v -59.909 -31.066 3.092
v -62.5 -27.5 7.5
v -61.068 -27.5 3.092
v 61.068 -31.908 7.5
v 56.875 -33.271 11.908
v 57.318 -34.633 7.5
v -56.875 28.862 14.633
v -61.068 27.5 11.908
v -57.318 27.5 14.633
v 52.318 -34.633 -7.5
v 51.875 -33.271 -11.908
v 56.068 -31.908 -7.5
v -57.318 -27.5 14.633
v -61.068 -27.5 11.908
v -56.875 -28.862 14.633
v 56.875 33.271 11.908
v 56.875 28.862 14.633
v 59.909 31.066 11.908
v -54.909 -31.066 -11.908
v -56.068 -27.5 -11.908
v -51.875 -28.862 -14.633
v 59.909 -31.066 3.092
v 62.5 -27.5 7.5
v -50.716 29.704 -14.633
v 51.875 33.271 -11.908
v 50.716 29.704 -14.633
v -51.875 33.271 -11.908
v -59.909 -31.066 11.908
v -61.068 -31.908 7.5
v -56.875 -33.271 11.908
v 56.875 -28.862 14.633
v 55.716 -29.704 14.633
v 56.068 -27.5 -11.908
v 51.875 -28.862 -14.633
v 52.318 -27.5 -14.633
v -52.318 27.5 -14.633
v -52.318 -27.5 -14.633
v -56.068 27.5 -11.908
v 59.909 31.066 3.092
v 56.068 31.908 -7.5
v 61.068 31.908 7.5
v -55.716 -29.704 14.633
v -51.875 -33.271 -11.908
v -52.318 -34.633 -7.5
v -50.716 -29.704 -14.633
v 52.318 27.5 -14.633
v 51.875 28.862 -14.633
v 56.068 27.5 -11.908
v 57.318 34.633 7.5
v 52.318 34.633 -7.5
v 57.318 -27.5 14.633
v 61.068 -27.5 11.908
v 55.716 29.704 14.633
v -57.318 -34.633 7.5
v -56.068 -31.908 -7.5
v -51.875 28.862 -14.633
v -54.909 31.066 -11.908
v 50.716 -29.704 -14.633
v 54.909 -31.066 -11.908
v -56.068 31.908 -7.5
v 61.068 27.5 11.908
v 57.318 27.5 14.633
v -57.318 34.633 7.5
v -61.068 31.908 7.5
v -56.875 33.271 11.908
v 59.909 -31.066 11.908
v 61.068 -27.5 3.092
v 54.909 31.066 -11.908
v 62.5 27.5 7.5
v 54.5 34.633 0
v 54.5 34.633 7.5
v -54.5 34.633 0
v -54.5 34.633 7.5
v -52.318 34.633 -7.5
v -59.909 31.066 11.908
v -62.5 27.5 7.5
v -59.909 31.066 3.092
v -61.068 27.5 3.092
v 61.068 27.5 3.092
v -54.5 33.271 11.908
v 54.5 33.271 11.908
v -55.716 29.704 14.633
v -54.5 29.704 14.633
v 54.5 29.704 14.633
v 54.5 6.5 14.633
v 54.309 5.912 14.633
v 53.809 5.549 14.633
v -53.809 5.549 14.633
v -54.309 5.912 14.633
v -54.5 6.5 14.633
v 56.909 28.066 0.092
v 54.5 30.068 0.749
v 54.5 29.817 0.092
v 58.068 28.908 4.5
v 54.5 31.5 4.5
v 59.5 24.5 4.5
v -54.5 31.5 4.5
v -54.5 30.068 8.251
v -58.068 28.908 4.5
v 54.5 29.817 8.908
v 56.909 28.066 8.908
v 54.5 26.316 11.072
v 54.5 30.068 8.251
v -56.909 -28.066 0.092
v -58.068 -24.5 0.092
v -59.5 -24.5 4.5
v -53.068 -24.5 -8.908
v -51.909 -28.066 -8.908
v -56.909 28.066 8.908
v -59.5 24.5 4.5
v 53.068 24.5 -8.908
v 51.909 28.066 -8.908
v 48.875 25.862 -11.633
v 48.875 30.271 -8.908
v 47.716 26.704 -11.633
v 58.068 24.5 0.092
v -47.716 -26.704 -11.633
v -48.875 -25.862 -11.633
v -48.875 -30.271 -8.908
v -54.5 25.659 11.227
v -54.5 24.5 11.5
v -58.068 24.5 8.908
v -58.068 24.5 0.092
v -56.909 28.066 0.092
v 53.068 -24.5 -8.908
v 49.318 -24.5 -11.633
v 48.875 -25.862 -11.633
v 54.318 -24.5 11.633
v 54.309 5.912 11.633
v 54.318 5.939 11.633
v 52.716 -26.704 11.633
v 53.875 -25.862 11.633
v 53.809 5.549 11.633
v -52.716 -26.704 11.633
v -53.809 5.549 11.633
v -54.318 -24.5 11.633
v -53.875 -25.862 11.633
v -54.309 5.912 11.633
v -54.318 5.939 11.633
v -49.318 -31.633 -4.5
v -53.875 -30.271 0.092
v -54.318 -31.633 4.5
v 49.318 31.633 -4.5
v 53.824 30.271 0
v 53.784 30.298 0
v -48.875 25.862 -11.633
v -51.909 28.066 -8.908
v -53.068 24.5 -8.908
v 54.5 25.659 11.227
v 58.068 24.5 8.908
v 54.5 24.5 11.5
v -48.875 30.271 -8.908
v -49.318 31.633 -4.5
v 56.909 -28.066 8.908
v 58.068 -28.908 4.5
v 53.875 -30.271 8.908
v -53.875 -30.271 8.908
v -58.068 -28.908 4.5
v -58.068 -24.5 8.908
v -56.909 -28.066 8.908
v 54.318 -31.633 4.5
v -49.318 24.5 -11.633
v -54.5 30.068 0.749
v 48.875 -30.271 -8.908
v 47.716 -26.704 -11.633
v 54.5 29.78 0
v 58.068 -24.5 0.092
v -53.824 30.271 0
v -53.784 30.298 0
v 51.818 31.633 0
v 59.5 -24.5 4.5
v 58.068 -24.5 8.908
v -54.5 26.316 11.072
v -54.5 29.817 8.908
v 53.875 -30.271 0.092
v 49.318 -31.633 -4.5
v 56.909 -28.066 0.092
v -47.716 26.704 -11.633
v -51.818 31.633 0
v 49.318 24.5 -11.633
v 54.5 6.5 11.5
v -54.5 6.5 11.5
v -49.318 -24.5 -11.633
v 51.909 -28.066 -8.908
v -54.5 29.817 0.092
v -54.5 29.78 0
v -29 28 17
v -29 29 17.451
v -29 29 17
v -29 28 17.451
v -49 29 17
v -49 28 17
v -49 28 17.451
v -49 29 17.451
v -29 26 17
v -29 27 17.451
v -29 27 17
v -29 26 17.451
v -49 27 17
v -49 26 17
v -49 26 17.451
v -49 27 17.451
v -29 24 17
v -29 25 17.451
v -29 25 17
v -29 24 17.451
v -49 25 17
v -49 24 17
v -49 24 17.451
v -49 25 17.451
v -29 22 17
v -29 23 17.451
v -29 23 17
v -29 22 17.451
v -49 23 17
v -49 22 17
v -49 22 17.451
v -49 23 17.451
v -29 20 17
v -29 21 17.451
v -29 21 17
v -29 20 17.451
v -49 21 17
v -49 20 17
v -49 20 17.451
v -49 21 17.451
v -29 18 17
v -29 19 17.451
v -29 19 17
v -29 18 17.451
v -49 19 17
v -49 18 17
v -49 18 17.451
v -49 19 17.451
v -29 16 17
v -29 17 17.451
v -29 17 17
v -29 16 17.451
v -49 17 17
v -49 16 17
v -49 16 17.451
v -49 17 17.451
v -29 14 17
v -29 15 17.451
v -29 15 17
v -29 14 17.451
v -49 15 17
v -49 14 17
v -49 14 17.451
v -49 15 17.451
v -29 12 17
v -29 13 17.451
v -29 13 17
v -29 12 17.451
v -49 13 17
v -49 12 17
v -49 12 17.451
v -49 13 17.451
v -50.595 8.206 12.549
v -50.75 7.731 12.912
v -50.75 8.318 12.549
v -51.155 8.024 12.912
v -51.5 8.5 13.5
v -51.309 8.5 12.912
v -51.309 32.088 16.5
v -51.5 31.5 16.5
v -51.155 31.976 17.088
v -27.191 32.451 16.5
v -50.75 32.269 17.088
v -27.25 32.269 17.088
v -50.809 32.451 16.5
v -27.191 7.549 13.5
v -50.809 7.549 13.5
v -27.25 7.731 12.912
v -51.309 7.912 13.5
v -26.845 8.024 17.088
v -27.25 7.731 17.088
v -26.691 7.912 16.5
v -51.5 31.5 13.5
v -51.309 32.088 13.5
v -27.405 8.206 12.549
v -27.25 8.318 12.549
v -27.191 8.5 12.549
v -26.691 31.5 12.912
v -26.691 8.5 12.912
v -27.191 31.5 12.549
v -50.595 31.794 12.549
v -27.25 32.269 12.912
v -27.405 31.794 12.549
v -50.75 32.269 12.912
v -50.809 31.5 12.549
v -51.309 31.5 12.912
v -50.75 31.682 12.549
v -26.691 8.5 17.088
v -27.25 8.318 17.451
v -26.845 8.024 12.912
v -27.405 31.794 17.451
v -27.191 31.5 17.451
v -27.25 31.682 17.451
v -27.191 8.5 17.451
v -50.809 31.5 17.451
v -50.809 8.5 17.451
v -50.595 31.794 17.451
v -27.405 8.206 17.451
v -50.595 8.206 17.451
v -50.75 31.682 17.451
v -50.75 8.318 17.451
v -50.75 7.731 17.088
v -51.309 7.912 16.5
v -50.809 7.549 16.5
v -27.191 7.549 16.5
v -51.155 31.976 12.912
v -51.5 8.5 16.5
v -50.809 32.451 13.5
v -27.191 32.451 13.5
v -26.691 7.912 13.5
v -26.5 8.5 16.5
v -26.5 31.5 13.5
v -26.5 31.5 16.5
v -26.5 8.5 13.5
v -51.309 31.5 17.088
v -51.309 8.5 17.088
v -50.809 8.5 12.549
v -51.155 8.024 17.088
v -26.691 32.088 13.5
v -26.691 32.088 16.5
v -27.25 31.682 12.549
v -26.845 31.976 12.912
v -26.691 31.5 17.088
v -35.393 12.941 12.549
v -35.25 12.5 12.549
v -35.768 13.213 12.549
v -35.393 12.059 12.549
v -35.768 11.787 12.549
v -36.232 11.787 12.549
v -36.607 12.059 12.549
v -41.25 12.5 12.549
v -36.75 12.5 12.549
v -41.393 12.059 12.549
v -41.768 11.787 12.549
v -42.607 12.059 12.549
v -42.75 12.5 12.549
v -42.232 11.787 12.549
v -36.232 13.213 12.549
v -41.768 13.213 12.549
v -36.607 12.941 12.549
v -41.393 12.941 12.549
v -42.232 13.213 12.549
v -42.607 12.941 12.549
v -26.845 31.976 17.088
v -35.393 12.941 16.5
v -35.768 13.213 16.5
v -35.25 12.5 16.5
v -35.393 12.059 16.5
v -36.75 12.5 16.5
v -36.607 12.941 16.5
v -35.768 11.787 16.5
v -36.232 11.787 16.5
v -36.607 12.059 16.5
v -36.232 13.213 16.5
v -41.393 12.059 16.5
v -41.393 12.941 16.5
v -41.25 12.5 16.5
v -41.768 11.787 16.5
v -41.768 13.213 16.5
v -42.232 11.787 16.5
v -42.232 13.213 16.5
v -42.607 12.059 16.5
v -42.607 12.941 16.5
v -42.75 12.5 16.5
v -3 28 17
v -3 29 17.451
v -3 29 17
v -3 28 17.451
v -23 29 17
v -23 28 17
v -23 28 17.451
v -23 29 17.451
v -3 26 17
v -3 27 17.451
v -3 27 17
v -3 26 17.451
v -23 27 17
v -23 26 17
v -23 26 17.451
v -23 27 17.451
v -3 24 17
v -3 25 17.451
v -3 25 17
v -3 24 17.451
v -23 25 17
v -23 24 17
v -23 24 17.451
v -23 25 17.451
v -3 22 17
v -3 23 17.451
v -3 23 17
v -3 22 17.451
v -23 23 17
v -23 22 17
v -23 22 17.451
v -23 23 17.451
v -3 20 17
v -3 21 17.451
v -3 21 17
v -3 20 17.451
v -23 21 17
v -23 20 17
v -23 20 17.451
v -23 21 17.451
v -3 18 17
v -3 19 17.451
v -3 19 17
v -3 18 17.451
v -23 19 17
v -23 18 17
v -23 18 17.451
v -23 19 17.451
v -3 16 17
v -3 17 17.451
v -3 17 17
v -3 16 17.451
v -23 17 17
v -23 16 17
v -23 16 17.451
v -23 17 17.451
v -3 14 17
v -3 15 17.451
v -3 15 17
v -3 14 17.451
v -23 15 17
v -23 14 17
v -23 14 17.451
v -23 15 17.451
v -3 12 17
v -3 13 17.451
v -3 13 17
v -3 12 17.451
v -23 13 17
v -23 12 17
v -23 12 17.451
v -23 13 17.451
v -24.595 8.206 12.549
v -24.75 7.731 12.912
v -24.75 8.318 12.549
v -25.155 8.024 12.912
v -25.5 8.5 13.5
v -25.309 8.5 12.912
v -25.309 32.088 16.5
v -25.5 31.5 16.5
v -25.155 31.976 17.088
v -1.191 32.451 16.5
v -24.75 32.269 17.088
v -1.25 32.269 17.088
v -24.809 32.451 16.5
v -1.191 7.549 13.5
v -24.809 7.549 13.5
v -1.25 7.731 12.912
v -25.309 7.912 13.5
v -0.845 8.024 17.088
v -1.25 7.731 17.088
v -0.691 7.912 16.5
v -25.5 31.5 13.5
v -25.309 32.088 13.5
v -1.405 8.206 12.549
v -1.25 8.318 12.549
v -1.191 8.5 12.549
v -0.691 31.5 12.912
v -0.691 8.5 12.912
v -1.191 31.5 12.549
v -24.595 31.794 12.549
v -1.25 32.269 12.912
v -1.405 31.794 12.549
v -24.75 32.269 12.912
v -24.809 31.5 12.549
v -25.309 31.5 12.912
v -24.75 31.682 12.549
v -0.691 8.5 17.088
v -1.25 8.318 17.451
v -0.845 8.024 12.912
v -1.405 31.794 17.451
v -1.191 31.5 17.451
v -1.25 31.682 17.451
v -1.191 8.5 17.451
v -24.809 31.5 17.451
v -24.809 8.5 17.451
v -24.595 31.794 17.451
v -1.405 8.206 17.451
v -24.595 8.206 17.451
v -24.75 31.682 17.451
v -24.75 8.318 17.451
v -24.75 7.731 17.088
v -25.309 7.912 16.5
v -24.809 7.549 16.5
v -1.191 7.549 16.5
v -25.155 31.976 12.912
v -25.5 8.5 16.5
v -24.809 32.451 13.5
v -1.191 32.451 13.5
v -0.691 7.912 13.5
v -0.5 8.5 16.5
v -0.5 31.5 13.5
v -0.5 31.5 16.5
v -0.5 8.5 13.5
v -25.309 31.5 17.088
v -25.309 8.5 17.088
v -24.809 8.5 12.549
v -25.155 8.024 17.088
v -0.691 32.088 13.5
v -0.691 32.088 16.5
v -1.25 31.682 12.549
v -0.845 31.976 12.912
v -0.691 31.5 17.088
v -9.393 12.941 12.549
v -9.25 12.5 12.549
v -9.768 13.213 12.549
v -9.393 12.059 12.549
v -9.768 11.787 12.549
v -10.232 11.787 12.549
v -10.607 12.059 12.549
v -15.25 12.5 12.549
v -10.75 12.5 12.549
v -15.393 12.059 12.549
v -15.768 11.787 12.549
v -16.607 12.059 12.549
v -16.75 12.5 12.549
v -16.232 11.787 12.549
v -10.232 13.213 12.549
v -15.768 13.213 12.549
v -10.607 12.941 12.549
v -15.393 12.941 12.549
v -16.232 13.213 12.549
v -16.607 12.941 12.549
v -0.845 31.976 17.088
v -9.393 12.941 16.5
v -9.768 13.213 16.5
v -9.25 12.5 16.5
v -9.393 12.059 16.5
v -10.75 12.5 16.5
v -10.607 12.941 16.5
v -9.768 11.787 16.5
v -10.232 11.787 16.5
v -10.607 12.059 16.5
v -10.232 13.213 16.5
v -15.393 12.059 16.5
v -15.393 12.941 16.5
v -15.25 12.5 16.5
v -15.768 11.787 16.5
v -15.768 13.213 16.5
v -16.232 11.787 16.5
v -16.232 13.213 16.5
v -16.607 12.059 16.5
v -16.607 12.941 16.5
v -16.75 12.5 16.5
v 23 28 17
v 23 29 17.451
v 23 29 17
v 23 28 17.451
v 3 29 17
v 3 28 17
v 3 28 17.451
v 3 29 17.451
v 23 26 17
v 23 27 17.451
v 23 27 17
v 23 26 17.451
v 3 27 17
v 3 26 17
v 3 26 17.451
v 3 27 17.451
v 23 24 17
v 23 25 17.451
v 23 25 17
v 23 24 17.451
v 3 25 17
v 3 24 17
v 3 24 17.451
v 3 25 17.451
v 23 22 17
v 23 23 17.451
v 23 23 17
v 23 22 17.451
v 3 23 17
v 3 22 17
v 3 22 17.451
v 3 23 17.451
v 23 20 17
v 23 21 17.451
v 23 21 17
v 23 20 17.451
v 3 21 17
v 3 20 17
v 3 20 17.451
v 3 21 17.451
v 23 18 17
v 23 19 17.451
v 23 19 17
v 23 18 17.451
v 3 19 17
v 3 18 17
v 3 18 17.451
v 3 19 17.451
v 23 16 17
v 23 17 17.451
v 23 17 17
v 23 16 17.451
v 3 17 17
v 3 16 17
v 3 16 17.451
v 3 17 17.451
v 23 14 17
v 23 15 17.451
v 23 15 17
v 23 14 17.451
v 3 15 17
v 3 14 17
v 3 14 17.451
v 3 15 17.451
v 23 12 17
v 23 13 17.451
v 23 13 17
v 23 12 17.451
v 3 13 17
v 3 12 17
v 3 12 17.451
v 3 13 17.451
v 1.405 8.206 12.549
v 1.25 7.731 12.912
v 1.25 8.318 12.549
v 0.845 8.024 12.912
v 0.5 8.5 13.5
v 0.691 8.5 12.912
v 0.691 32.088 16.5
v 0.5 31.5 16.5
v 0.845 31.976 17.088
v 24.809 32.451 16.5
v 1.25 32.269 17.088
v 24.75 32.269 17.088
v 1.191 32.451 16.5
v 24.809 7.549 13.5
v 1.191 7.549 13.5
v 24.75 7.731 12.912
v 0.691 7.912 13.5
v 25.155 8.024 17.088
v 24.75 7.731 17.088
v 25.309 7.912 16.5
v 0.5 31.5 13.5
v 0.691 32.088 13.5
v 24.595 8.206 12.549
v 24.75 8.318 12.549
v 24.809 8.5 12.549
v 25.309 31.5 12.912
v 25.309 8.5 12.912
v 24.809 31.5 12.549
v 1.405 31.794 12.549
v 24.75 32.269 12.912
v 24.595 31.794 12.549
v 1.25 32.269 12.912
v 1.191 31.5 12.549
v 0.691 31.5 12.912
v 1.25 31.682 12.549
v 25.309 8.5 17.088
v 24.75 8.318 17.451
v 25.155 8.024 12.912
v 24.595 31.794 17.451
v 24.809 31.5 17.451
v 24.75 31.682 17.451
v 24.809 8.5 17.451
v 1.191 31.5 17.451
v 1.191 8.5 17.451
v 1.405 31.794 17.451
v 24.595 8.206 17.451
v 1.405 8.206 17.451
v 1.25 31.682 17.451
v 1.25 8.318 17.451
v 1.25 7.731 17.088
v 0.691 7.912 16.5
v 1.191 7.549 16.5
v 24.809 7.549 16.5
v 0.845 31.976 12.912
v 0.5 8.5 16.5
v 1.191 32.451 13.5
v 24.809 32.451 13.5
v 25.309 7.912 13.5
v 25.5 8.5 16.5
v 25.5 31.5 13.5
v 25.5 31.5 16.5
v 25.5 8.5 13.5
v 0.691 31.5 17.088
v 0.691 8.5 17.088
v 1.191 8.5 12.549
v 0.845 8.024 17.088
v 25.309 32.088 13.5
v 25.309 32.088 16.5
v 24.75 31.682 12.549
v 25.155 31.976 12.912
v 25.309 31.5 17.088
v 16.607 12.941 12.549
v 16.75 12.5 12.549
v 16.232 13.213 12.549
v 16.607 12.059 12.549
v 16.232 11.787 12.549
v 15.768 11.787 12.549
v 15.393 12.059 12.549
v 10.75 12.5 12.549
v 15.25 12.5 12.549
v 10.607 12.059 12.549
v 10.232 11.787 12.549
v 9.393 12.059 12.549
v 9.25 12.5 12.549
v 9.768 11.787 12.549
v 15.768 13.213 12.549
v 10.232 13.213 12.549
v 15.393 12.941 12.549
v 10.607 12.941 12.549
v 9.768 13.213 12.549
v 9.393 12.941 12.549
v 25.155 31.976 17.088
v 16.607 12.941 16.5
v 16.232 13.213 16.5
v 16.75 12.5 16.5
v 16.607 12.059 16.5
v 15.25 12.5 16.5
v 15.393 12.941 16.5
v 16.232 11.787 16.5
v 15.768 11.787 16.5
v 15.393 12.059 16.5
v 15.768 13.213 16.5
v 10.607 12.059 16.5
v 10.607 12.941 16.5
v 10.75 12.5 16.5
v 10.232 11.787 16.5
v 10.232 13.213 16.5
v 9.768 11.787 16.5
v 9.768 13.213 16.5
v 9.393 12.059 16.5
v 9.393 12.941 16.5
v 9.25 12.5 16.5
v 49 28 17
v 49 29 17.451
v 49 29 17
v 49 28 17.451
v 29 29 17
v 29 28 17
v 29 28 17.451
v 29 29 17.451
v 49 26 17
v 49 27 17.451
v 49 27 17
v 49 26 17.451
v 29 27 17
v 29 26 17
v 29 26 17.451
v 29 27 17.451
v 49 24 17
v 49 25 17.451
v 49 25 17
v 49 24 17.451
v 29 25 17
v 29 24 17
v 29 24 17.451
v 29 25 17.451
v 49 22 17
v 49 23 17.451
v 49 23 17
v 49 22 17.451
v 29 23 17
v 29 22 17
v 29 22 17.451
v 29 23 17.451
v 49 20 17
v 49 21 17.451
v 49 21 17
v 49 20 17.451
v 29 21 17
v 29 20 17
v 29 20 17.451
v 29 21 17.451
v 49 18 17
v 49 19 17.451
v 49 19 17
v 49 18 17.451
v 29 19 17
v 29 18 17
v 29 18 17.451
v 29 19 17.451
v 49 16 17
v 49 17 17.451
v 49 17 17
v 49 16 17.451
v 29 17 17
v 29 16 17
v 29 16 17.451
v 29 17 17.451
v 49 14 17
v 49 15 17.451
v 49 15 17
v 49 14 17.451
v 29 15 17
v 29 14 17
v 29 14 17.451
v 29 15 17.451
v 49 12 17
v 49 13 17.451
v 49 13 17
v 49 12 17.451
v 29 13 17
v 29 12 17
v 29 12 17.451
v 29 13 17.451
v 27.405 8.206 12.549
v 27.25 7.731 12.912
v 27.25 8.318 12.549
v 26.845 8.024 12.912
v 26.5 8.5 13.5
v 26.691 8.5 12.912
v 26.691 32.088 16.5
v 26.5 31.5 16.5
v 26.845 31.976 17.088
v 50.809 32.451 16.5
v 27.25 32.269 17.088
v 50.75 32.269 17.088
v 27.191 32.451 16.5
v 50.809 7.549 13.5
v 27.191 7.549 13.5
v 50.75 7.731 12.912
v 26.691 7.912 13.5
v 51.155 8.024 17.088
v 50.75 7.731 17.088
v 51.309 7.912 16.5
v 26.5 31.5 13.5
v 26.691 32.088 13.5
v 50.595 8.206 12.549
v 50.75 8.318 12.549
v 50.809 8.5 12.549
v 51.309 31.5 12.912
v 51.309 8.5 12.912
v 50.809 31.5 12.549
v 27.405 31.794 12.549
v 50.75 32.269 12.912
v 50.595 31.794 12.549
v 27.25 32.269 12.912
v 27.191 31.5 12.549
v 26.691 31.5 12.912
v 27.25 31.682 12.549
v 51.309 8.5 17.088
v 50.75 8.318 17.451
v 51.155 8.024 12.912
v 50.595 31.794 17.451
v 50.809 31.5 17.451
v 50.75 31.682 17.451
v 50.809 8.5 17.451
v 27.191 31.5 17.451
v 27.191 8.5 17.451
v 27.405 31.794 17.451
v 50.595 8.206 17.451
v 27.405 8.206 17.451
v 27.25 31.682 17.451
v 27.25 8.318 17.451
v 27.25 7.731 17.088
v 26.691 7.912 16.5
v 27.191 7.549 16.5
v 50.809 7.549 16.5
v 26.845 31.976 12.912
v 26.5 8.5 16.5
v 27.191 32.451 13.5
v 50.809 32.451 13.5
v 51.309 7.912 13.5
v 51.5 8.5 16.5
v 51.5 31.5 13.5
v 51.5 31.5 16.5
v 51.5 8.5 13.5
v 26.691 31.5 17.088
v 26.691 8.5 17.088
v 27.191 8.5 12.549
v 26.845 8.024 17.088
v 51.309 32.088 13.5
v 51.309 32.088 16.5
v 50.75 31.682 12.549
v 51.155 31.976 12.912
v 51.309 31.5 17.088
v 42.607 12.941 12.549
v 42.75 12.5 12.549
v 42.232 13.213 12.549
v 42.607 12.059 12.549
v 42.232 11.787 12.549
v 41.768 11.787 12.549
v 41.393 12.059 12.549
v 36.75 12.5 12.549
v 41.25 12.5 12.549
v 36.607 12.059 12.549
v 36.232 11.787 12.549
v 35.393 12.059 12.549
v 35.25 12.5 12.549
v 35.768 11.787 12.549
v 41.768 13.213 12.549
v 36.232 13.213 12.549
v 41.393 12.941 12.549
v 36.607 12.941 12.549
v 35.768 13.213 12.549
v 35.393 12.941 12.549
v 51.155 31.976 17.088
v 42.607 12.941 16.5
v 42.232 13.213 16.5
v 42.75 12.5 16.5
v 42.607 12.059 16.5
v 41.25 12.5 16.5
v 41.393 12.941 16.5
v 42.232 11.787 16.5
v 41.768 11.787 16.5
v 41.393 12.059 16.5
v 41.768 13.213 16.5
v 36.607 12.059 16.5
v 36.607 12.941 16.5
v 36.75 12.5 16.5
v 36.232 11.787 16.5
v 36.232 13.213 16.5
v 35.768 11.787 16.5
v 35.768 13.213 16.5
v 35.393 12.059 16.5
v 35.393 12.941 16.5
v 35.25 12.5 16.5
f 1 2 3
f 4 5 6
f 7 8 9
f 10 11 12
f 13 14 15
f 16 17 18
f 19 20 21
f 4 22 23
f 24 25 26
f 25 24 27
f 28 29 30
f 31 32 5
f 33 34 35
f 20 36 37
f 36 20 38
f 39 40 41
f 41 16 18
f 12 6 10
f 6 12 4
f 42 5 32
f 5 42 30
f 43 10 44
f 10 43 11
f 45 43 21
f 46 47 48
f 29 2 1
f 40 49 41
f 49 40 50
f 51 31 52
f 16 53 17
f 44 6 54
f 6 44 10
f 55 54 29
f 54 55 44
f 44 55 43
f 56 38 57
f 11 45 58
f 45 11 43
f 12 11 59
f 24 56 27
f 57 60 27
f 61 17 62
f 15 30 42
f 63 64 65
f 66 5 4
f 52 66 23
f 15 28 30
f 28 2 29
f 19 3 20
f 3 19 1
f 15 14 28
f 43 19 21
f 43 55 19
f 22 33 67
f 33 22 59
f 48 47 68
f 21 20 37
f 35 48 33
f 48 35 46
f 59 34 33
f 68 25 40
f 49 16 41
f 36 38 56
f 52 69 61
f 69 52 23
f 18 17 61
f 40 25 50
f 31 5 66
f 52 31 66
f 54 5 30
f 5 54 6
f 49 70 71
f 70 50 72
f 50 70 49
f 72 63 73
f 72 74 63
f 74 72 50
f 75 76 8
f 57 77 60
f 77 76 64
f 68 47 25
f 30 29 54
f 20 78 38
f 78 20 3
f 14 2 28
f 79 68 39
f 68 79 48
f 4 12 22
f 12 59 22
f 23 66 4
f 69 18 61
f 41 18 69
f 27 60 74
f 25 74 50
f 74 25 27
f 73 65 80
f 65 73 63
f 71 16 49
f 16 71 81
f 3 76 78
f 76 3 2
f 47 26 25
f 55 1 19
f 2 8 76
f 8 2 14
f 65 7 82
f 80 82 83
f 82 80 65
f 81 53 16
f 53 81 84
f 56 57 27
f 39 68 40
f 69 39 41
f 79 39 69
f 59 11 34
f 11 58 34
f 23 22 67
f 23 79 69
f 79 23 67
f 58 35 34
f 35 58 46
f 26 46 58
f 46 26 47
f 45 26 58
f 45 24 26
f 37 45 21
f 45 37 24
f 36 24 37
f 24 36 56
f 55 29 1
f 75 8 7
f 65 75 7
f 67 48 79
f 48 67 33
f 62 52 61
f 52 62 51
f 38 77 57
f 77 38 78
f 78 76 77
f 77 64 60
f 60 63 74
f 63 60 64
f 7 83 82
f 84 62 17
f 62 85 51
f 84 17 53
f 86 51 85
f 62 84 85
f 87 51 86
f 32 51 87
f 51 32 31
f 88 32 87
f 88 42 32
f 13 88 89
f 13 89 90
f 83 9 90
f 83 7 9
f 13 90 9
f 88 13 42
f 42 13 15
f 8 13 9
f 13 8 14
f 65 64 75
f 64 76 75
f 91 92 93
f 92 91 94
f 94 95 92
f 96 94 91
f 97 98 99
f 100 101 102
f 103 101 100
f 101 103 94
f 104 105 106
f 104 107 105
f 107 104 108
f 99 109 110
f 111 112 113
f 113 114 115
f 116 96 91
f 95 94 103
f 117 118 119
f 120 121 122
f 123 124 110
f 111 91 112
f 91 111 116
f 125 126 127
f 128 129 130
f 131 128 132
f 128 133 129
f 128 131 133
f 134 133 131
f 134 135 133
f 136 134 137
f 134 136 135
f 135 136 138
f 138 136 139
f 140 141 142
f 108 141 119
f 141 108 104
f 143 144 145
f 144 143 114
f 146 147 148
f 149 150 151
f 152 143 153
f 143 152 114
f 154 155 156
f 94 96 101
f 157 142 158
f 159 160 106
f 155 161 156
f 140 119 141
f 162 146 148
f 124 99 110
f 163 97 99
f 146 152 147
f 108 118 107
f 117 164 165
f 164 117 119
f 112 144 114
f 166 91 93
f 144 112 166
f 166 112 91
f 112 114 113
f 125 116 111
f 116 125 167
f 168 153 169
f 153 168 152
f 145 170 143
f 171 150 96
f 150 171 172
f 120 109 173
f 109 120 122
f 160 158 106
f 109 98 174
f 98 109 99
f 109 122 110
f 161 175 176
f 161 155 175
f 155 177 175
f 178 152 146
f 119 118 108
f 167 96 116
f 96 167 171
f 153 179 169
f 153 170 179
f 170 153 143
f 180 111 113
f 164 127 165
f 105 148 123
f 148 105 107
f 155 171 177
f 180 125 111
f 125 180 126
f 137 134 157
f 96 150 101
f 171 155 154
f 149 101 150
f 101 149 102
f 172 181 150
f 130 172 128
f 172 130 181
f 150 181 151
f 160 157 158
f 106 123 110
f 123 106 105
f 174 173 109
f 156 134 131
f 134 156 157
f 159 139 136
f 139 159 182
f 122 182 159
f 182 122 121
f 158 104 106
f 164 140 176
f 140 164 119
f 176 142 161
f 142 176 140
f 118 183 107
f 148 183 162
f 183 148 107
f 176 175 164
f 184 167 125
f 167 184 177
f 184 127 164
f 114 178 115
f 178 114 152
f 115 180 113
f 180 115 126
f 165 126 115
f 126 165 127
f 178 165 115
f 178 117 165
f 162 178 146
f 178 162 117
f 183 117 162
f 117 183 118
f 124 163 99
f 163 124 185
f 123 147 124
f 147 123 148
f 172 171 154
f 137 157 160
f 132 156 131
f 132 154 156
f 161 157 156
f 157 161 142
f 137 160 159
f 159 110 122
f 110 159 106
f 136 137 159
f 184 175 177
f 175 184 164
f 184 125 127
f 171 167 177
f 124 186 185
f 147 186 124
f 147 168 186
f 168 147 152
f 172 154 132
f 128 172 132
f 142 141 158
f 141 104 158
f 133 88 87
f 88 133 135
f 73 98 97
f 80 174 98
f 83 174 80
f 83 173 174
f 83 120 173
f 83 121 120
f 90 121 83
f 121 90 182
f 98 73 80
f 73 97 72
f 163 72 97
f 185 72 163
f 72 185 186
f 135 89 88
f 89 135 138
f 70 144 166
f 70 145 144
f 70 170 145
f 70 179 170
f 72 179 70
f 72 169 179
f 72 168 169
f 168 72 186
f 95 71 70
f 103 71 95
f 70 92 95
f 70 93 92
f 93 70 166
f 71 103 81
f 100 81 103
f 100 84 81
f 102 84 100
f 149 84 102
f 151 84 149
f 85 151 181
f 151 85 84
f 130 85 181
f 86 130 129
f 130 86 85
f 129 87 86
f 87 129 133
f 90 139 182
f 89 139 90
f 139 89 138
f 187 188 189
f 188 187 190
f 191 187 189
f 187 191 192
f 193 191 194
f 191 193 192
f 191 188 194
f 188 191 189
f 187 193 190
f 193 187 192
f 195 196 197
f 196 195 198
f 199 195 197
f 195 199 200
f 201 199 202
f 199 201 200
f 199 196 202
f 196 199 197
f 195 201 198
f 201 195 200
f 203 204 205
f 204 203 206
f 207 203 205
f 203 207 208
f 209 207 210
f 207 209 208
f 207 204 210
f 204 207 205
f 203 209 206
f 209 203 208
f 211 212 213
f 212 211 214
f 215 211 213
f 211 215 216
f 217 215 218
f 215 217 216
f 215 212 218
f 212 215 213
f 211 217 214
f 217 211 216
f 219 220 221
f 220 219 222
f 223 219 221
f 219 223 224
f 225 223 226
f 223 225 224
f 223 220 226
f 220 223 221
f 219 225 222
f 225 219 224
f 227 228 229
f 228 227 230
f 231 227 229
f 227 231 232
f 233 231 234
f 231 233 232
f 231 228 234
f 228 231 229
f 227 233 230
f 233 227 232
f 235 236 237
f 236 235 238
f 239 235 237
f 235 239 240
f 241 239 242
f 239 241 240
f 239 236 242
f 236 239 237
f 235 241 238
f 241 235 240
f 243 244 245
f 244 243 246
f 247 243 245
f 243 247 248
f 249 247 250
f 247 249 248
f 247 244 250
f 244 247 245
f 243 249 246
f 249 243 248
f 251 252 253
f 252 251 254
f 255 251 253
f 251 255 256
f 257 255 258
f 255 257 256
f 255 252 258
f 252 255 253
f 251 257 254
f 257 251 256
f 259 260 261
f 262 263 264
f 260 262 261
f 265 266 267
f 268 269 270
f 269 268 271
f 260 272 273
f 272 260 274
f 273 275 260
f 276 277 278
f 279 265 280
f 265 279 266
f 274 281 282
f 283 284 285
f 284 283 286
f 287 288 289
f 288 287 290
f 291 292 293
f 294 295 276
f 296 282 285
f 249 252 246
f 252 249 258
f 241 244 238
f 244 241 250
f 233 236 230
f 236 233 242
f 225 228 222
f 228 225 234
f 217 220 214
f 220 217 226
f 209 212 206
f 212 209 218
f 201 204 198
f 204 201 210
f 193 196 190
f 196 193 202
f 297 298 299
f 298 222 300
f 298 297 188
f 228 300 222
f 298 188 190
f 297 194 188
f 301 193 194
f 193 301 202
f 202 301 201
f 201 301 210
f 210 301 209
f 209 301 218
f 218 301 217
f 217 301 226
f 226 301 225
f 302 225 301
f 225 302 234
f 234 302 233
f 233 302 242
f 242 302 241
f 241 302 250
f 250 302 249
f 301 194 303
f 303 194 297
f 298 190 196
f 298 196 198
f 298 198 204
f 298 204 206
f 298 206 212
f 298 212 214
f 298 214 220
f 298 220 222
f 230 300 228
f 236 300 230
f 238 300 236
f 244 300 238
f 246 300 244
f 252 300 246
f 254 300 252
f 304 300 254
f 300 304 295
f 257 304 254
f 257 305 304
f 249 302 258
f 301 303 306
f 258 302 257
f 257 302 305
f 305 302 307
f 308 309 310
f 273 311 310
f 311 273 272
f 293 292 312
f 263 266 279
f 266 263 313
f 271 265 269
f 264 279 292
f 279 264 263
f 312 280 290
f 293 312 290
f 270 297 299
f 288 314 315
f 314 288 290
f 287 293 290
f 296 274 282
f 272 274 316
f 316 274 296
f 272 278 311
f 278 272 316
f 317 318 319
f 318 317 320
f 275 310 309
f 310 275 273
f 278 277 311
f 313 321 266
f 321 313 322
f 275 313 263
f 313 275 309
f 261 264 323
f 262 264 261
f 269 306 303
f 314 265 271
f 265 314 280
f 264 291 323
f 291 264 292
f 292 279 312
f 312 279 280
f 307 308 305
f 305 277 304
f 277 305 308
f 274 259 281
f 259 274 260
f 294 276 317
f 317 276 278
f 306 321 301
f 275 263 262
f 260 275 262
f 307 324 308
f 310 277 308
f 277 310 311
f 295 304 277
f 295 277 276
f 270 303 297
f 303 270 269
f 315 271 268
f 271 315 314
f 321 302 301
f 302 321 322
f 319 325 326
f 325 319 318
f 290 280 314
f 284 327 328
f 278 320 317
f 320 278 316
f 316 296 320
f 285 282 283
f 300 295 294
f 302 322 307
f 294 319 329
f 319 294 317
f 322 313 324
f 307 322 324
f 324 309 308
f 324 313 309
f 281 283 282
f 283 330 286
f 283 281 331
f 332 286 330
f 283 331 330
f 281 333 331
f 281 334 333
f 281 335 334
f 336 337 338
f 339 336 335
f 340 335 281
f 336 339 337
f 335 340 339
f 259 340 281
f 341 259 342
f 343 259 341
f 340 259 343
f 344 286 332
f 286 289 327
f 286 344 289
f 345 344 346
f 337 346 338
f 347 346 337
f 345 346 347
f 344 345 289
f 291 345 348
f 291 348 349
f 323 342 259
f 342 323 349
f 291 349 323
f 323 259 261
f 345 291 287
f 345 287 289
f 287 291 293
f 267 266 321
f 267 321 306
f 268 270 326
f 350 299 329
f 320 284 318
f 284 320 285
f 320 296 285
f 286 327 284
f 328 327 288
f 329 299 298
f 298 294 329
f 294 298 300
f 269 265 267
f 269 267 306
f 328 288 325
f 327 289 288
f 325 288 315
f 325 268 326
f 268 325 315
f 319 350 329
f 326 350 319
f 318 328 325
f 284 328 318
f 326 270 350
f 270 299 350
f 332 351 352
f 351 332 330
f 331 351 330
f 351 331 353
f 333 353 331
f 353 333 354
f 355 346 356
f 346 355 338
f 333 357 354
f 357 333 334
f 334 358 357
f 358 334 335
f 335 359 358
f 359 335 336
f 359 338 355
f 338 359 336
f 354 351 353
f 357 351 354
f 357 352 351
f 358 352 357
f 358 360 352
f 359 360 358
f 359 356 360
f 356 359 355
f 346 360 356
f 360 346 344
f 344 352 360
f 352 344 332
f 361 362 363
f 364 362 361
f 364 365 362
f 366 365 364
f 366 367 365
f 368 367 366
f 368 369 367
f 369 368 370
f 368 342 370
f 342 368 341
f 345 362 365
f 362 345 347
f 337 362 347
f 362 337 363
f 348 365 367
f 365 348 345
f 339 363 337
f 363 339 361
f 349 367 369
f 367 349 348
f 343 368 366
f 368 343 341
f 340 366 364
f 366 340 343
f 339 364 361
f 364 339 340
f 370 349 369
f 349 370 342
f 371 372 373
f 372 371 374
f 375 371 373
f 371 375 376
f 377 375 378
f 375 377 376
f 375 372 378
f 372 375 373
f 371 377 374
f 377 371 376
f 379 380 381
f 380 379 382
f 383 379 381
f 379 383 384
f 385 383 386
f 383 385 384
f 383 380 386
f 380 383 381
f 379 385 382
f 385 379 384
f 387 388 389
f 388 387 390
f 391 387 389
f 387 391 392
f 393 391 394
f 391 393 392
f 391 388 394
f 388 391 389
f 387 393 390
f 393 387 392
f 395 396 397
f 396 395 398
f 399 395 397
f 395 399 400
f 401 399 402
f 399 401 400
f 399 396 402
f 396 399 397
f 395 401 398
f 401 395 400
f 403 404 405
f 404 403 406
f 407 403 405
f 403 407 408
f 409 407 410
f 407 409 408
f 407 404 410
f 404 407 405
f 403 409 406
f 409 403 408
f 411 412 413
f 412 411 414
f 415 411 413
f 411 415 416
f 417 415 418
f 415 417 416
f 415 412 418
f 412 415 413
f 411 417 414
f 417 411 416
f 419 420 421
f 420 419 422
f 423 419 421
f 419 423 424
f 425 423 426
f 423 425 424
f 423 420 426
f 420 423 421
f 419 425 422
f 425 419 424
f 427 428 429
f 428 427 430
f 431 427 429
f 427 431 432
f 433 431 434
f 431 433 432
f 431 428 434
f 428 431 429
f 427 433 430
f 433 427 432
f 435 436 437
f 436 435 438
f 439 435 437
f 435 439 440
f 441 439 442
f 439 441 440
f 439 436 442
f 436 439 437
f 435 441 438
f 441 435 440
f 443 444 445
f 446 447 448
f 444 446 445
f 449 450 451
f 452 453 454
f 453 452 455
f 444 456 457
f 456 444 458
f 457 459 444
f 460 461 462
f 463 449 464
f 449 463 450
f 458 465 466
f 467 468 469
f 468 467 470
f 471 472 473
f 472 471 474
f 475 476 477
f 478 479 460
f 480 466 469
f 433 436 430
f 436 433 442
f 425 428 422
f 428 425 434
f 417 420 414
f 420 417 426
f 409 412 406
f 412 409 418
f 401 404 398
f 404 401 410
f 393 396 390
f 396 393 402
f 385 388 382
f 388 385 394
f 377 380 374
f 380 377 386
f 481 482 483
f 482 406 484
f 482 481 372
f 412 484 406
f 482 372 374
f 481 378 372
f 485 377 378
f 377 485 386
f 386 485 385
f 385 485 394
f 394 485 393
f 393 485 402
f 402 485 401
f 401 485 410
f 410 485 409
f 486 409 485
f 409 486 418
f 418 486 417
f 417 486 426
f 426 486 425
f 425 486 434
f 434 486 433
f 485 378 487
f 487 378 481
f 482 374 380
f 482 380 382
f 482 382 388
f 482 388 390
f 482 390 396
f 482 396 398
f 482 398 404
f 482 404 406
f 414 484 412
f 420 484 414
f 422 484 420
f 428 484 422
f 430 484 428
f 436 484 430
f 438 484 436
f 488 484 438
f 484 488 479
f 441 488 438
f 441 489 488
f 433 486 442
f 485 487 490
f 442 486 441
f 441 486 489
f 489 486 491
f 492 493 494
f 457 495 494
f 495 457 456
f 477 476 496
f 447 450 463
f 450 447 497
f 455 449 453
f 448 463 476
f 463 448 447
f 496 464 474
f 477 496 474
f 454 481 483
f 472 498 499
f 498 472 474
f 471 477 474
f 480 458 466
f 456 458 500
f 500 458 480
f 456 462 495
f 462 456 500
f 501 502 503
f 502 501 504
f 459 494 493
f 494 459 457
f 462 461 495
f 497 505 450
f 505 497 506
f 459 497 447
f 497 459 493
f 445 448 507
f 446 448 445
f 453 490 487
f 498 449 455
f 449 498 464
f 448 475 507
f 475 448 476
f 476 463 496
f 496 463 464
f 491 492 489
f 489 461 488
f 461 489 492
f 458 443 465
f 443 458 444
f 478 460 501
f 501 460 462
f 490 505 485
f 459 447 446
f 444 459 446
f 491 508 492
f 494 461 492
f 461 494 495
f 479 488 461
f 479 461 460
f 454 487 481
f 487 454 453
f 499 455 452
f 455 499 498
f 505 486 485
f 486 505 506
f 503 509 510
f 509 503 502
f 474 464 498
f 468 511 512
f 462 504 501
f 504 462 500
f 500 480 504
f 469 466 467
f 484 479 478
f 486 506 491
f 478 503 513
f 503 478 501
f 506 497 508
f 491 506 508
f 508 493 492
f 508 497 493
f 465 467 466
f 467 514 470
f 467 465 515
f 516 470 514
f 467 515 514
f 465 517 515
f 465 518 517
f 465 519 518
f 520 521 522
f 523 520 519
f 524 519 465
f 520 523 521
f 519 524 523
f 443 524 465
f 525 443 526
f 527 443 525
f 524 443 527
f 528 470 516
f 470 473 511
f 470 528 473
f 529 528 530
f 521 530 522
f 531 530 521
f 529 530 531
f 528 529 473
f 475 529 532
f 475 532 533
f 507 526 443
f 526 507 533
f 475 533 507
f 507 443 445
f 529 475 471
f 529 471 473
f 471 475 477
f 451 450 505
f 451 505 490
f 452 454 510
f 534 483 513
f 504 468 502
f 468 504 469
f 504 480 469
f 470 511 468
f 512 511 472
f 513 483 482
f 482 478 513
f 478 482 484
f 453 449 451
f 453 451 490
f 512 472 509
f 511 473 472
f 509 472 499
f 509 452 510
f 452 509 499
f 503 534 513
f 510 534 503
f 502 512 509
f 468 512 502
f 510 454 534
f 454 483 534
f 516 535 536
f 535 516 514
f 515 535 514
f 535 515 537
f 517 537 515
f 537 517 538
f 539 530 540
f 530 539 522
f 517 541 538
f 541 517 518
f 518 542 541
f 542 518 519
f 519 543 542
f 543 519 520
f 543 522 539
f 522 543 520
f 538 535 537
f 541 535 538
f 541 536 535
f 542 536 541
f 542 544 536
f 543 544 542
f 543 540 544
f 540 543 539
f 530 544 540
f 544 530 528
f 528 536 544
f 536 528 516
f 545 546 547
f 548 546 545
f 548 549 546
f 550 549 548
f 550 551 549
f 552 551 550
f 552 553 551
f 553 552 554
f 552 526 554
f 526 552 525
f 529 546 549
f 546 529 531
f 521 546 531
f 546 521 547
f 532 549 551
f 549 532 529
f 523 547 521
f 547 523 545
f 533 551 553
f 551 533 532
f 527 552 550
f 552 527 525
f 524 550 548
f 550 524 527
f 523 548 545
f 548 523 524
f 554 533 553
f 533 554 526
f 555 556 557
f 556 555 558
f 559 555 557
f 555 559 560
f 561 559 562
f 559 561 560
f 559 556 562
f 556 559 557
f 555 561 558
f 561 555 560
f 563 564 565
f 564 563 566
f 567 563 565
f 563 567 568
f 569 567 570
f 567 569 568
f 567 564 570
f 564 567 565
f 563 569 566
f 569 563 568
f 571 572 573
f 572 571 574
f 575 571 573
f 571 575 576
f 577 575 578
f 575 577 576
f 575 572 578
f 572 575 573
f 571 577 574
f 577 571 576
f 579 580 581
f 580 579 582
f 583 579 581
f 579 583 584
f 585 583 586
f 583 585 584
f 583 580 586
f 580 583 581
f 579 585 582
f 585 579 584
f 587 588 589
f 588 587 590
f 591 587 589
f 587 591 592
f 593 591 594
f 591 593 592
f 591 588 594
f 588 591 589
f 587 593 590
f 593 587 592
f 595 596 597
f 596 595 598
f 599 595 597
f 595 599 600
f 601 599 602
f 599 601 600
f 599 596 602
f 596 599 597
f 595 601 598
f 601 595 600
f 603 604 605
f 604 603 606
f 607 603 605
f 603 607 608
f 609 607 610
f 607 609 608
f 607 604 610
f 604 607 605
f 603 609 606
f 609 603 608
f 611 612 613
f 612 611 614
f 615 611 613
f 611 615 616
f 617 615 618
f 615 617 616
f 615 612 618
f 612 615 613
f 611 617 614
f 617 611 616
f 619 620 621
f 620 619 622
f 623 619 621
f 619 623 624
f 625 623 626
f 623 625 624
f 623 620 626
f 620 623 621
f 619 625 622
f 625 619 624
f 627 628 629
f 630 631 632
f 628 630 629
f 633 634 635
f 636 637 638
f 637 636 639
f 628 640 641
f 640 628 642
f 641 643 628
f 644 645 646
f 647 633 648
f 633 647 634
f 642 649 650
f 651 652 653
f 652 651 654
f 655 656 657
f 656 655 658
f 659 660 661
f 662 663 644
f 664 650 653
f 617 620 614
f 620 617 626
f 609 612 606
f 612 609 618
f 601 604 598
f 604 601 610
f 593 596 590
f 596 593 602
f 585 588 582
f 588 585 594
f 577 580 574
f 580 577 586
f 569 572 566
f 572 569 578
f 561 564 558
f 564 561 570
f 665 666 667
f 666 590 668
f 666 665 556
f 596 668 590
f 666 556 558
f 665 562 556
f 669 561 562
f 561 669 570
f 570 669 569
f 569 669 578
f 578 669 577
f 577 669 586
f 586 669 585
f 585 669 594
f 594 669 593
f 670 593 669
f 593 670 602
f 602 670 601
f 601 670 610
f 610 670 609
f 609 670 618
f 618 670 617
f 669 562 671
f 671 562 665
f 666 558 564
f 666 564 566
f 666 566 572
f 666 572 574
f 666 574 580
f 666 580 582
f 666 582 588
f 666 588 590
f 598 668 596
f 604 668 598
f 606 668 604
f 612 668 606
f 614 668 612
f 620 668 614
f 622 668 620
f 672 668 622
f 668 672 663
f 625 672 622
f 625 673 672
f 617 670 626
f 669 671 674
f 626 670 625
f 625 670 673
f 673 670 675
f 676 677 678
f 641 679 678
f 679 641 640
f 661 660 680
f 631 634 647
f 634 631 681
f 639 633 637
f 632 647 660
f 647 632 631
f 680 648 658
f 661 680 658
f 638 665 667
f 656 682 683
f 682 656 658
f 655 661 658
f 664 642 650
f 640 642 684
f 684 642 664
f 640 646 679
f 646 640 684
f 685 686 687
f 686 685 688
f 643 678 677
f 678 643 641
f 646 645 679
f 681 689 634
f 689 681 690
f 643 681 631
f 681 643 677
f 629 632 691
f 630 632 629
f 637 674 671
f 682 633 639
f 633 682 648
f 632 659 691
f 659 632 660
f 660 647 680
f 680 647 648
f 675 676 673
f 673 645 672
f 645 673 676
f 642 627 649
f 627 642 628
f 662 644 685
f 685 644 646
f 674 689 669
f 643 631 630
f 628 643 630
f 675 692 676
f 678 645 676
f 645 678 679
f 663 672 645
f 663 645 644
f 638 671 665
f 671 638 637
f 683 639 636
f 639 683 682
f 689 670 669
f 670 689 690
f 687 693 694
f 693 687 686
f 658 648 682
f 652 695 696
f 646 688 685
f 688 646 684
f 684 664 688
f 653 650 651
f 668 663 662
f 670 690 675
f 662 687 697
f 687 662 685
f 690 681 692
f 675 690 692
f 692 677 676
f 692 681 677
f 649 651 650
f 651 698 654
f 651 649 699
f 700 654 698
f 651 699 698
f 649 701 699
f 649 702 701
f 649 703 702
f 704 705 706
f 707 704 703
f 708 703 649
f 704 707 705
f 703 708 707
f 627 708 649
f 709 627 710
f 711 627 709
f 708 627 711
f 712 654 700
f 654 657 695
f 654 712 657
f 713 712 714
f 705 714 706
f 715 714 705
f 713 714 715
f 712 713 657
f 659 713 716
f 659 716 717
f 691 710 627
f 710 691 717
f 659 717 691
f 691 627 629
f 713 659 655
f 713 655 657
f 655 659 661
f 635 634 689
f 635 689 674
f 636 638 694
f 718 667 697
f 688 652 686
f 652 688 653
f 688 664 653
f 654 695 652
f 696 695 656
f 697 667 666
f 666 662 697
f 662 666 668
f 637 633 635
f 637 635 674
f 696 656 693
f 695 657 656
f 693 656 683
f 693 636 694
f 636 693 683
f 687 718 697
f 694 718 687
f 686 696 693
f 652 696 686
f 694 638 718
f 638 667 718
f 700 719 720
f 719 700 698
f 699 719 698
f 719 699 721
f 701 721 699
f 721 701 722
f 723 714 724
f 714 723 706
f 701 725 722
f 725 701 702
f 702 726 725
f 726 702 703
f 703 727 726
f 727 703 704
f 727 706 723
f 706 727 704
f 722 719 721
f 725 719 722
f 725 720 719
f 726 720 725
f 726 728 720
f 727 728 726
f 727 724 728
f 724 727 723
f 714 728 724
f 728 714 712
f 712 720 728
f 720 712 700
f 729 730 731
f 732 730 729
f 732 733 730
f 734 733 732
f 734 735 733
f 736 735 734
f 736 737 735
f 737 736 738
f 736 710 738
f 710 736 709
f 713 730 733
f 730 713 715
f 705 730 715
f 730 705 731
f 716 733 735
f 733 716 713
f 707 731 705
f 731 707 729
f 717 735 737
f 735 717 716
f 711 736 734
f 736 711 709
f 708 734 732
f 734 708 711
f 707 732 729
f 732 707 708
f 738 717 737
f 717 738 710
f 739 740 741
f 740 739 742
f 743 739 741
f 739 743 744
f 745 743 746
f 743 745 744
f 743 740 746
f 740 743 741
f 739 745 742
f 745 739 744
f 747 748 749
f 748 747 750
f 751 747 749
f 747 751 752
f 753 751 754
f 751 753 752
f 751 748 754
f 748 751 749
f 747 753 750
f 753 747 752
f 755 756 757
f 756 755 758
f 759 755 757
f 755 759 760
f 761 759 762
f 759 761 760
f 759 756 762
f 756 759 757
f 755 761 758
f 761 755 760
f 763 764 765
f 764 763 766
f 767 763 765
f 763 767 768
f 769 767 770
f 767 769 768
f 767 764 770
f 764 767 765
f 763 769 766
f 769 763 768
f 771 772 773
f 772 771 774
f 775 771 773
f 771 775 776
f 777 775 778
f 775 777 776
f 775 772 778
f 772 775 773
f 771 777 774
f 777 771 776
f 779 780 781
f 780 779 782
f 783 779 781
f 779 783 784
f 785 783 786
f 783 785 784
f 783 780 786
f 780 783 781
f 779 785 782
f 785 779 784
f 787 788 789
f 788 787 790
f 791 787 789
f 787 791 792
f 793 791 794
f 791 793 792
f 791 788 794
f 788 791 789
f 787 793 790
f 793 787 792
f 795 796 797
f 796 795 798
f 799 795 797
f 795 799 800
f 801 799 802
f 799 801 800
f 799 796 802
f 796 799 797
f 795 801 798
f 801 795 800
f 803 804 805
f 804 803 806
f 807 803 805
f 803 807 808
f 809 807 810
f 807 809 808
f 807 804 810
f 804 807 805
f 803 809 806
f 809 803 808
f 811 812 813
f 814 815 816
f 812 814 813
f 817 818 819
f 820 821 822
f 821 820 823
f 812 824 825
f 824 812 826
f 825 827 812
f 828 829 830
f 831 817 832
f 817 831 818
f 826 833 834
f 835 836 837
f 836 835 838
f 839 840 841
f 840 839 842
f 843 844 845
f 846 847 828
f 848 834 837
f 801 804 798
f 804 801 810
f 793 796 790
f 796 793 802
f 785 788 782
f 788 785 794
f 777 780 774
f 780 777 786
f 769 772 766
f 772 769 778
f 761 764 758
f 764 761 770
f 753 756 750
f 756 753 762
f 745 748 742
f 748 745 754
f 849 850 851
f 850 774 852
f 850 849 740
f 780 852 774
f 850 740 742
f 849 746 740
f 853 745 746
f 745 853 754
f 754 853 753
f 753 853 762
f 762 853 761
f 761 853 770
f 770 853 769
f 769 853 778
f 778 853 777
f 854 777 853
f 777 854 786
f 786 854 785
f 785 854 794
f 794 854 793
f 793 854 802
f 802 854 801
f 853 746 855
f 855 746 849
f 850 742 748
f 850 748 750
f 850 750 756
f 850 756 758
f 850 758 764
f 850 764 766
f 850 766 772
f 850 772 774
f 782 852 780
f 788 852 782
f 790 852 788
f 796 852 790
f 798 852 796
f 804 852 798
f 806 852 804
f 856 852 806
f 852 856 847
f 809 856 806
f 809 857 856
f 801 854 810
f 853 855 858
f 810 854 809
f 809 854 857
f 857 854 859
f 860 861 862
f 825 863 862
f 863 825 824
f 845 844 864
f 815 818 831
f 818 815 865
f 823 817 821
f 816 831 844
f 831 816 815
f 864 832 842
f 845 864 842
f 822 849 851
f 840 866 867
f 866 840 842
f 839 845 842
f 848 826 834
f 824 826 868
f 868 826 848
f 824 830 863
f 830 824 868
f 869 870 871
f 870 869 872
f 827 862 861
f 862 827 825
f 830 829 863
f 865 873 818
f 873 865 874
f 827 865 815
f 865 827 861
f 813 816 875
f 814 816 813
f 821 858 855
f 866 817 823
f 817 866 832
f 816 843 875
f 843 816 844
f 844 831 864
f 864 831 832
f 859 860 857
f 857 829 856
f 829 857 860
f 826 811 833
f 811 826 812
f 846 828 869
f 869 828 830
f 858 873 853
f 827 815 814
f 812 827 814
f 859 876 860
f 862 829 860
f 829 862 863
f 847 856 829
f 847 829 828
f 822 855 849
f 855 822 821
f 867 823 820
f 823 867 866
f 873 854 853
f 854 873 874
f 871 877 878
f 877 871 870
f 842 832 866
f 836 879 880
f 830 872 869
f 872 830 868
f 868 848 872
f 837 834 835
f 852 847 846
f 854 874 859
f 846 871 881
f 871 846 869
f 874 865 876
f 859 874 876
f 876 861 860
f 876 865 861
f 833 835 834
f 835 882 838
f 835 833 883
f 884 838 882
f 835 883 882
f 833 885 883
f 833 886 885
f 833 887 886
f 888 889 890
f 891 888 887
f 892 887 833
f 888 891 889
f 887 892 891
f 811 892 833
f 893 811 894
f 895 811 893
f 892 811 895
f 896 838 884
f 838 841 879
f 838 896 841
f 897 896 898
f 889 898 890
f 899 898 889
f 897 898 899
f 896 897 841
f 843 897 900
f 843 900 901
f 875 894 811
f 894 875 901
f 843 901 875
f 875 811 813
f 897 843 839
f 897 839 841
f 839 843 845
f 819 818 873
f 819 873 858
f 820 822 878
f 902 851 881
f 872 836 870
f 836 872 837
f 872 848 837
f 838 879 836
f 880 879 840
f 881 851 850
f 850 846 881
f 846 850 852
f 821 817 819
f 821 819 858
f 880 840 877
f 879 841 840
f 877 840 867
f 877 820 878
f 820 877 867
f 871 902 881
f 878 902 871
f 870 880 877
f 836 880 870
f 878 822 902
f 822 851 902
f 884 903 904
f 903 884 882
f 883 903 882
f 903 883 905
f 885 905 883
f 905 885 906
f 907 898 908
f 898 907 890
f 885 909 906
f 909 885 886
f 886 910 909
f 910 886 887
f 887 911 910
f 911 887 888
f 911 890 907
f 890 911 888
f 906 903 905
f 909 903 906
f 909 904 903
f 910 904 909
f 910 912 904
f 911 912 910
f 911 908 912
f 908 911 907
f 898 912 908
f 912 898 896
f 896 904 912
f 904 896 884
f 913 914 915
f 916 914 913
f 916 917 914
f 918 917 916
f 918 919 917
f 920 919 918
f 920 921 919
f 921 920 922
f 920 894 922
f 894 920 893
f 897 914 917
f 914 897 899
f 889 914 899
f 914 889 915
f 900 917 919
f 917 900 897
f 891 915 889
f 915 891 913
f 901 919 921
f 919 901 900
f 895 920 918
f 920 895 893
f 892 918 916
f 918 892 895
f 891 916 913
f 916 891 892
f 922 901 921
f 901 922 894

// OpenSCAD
$fn =10 ;
e = 3 ;

touche_x = 25 ;
touche_y = 25 ;
touche_z = 5 ;
touche_n= 4 ;
touche_s = 2 ;
touche_dd = 1 ;

touches_dy = 20 ; 

boitier_x = (touche_n + 1)*touche_x ;
boitier_y = touche_y + 45  ;
boitier_z = 30 ;
boitier_s = 15 ;
boitier_dx = -5 ;

// bouton ckn10362 digikey  C&K HS-2206-A1 NS
bye = 24.2 ;
by = 16.4 ;
byl = bye-by ;
bxe = 17.1 ;
bx = 14.5 ;
bz = 8.2 ;
bxr = 13.7 ;
byr = 3.3 ;
bzr=2 ;
bdr = 3.5 ;
bdre = 2.1 ;
bxb= 12.3 ;

bdxv = 3 ;
bdyv = 5 ;

bp1x= 1.8 ;
bp1y=1.6 ;
bp1dx = bxb/2 - bp1x/2 ;
bp1dy = 8.25 - bp1y/2 ;

bp2x=1.4 ;
bp2y=1.8 ;
bp2dx = bxb/2 - bp2x /2 ;
bp2dy = -(8.25- bp2y / 2) ;

bpz = 2.6 - 1 ;
bpze= 2.6 ;

be = 2;

module bouton()
{
    // plateau mobile
    difference()
    {
        translate([0,by/2+(bye-by)/2,bz -1])
            cube([bx,bye-by,2],center = true);
        // trou de vis
        translate([bdxv,bdyv+by/2,bz -1])
            cylinder(d=2, h = 5 , center = true);
        translate([-bdxv,bdyv+by/2,bz -1])
            cylinder(d=2, h = 5 , center = true);
    }
    
    // boitier
    difference()
    {
        union()
        {
            //boitier corps dessus
            translate([0,0,bz/2 + 1])
                cube([bx,by,bz -2 ],center = true);
            //boitier corps dessous
            translate([0,0, 1])
                cube([bxb,by,2 ],center = true);
            // cylindres de positionnement
            translate([bxr/2,byr,bzr/2])
                cylinder(d=bdr , h = bzr , center = true );
            translate([-bxr/2,byr,bzr/2])
                cylinder(d=bdr , h = bzr , center = true );
        }
        // trous dans les cylindres de positionnement
        translate([bxr/2,byr,bzr/2])
            cylinder(d=bdre , h = bzr+2 , center = true );
        translate([-bxr/2,byr,bzr/2])
            cylinder(d=bdre , h = bzr+2 , center = true );
    }
    
    // pattes de fixation
    translate([bp1dx,bp1dy,-bpze/2])
        cube([bp1x,bp1y,bpze],center = true);
    translate([bp1dx,bp1dy+0.25,-be - (bpze -be)/2])
        cube([bp1x,bp1y+0.25,bpze -be],center = true);
    
    translate([-bp1dx,bp1dy,-bpze/2])
        cube([bp1x,bp1y,bpze],center = true);
    translate([-bp1dx,bp1dy+0.25,-be - (bpze -be)/2])
        cube([bp1x,bp1y+0.25,bpze -be],center = true);

    translate([bp2dx,bp2dy,-bpze/2])
        cube([bp2x,bp2y,bpze],center = true);
    translate([bp2dx+0.25,bp2dy,-be - (bpze -be)/2])
        cube([bp1x+0.25,bp1y,bpze -be],center = true);

    translate([-bp2dx,bp2dy,-bpze/2])
        cube([bp2x,bp2y,bpze],center = true);
    translate([-bp2dx-0.25,bp2dy,-be - (bpze -be)/2])
        cube([bp1x+0.25,bp1y,bpze -be],center = true);
    
    // pattes connecteurs
    translate([2.5,0,-2.6/2])
        cube([1,1,2.6],center = true);
    translate([-2.5,0,-2.6/2])
        cube([1,1,2.6],center = true);
    translate([2.5,5,-2.6/2])
        cube([1,1,2.6],center = true);
    translate([-2.5,5,-2.6/2])
        cube([1,1,2.6],center = true);
    translate([2.5,-5,-2.6/2])
        cube([1,1,2.6],center = true);
    translate([-2.5,-5,-2.6/2])
        cube([1,1,2.6],center = true);
}
module bouton_empreinte()
{
    bouton() ;
    translate([0,0,-be/2])
        cube([bxb, by, be], center = true);
    translate([bxr/2,byr,-be/2])
        cylinder(d=bdre,h=be,center = true);
    translate([-bxr/2,byr,-be/2])
        cylinder(d=bdre,h=be,center = true);
}

module boitier_cube(de)
{
    hull()
    {
        translate([boitier_x/2 - boitier_s/2 - de , boitier_y/2- boitier_s/2  - de, boitier_z/2- boitier_s/2 - de ])
            sphere(d=boitier_s);
        translate([-(boitier_x/2 - boitier_s/2 - de) , boitier_y/2- boitier_s/2  - de, boitier_z/2- boitier_s/2  - de])
            sphere(d=boitier_s);
        translate([boitier_x/2 - boitier_s/2 - de , -(boitier_y/2- boitier_s/2  - de) , boitier_z/2- boitier_s/2  - de])
            sphere(d=boitier_s);
        translate([-(boitier_x/2 - boitier_s/2 - de) , -(boitier_y/2- boitier_s/2 - de), boitier_z/2- boitier_s/2  - de])
            sphere(d=boitier_s);
        translate([boitier_x/2 - boitier_s/2 +boitier_dx  - de, boitier_y/2- boitier_s/2 - de , -(boitier_z/2- boitier_s/2 - de) ])
            sphere(d=boitier_s);
        translate([-(boitier_x/2 - boitier_s/2+boitier_dx  - de) , boitier_y/2- boitier_s/2 - de , - (boitier_z/2- boitier_s/2  - de)])
            sphere(d=boitier_s);
        translate([boitier_x/2 - boitier_s/2 +boitier_dx  - de, -(boitier_y/2- boitier_s/2 - de ) ,- (boitier_z/2- boitier_s/2 - de)])
            sphere(d=boitier_s);
        translate([-(boitier_x/2 - boitier_s/2+boitier_dx - de ) , -(boitier_y/2- boitier_s/2 - de), - (boitier_z/2- boitier_s/2 - de)])
            sphere(d=boitier_s);
    }
}
module touche()
{
    difference()
    {
        hull()
        {
            translate([touche_x/2-touche_s/2, touche_y/2 - touche_s/2,touche_z/2- touche_s/2])
                sphere(d=touche_s);
            translate([-(touche_x/2-touche_s/2), touche_y/2- touche_s/2,touche_z/2- touche_s/2])
                sphere(d=touche_s);
            translate([touche_x/2-touche_s/2, -(touche_y/2- touche_s/2),touche_z/2- touche_s/2])
                sphere(d=touche_s);
            translate([-(touche_x/2-touche_s/2), -(touche_y/2- touche_s/2),touche_z/2- touche_s/2])
                sphere(d=touche_s);
            translate([touche_x/2-touche_s/2, touche_y/2- touche_s/2,-(touche_z/2- touche_s/2)])
                sphere(d=touche_s);
            translate([-(touche_x/2-touche_s/2), touche_y/2- touche_s/2,-(touche_z/2- touche_s/2)])
                sphere(d=touche_s);
            translate([touche_x/2-touche_s/2, -(touche_y/2- touche_s/2),-(touche_z/2- touche_s/2)])
                sphere(d=touche_s);
            translate([-(touche_x/2-touche_s/2), -(touche_y/2- touche_s/2),-(touche_z/2- touche_s/2)])
                sphere(d=touche_s);
        }
        // trou de vis
        translate([bdxv,bdyv - touche_y/2,-1])
            cylinder(d=1.5, h = touche_z , center = true);
        translate([-bdxv,bdyv - touche_y/2,-1])
            cylinder(d=1.5, h = touche_z , center = true);
        // rainures
        for(i=[2:10])
        {
            translate([0,touche_y/2 - i * 2, touche_z/2])
                cube([touche_x-5,1,1],center = true);
        }
    }
}
 module touches()
{
    hull()
    {
        translate([2+((touche_n * touche_x + (touche_n + 1) * touche_dd )/2- touche_s/2) , 4+ touche_y/2 + 2 * touche_dd- touche_s/2 , 0 ])
            cylinder(d=touche_s , h = 6* touche_z , center = true ) ;
        translate([-2-((touche_n * touche_x + (touche_n + 1) * touche_dd)/2 - touche_s/2) , 4+ touche_y/2 + 2 * touche_dd- touche_s/2 , 0 ])
            cylinder(d=touche_s , h = 6* touche_z , center = true ) ;
        translate([2+((touche_n * touche_x + (touche_n + 1) * touche_dd) /2  - touche_s/2) , -(touche_y/2 + 2 * touche_dd- touche_s/2 ), 0 ])
            cylinder(d=touche_s , h = 6* touche_z , center = true ) ;
        translate([-2-((touche_n * touche_x + (touche_n + 1) * touche_dd )/2 - touche_s/2) , -(touche_y/2 + 2 * touche_dd- touche_s/2) , 0 ])
            cylinder(d=touche_s , h = 6* touche_z , center = true ) ;
    }
}
*bouton();
*bouton_empreinte();
*touche() ;
*touches();
difference()
{
    boitier_cube(0);
    boitier_cube(e);
    translate([0,touches_dy,boitier_z/2])
        touches();
    *translate([500,0,0])
        cube([1000,1000,1000],center=true);
}
for(i=[1:touche_n])
{
    translate([(i-(touche_n+1)/2) * ( touche_x + touche_dd ) , touches_dy, boitier_z/2])
        touche() ;
}
    
